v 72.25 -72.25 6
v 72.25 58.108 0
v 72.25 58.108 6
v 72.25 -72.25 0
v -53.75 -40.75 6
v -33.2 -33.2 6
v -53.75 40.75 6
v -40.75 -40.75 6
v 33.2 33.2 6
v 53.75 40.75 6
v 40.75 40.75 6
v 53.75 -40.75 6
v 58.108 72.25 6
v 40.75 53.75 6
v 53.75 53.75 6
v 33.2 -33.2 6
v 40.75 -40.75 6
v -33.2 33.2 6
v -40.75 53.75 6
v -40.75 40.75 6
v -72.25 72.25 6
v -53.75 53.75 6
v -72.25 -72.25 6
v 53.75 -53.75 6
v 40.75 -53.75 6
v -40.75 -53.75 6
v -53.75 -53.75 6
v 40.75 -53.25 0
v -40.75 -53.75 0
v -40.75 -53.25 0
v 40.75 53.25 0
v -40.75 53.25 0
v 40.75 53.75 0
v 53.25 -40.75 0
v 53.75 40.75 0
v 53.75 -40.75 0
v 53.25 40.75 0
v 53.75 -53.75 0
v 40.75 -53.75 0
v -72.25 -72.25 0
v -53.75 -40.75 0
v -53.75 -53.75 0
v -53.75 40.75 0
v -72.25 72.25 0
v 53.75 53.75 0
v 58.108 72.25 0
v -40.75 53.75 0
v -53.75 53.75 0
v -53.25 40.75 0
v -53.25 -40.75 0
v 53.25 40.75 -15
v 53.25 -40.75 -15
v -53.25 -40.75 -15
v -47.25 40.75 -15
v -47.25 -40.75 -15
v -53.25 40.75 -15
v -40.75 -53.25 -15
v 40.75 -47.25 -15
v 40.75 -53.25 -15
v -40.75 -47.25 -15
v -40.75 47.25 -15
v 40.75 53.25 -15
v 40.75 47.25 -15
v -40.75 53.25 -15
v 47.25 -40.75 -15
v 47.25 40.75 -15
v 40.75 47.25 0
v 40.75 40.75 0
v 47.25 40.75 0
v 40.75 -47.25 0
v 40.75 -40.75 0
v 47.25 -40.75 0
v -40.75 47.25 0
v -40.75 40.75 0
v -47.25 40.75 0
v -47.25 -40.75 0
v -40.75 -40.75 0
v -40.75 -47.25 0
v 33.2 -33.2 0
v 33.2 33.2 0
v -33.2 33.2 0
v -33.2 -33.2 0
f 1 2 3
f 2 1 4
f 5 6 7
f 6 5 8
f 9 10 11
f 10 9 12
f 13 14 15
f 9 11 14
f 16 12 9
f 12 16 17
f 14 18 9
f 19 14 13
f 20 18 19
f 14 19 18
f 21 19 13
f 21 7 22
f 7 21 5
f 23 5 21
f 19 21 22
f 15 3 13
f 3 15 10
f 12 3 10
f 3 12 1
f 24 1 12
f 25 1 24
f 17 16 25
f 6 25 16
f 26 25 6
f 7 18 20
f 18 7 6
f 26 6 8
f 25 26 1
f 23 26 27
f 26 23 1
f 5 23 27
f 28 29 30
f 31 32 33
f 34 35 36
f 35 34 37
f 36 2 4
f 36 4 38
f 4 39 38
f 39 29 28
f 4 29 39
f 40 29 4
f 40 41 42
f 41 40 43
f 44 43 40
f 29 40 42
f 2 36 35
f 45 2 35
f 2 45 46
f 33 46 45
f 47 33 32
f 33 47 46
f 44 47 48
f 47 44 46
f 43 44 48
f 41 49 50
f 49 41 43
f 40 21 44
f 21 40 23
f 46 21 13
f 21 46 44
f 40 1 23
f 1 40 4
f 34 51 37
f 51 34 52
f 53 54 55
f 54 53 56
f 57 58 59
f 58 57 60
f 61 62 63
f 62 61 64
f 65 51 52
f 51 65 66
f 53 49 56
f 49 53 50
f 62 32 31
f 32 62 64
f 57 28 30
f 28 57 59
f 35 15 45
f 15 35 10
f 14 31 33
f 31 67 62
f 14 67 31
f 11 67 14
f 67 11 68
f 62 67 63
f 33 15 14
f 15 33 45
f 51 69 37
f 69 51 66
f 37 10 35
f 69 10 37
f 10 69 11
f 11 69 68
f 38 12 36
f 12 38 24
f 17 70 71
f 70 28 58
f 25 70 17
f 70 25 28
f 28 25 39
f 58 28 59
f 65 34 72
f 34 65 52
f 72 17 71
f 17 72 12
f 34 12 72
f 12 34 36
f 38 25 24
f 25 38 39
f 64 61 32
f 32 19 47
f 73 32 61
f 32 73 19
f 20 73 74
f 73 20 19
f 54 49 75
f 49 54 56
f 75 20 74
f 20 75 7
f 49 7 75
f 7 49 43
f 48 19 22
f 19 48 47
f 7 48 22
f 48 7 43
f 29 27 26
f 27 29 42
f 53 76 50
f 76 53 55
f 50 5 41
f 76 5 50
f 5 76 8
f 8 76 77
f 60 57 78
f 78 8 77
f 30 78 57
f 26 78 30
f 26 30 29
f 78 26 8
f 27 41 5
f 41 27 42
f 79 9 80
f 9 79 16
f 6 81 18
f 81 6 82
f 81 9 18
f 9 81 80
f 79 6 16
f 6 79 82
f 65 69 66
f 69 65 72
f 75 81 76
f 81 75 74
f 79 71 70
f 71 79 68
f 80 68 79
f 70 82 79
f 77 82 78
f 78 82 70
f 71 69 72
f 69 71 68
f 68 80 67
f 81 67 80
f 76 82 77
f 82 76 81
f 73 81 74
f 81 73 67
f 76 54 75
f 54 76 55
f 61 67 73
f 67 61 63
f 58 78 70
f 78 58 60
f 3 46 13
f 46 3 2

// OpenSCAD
// William Box Jig

OD = 94.5;
ID = 66.4;
Wall = 6;
Extra = 50;

difference() {
  union() {
    // Top plate
    translate([0,0,Wall/2]) cube([OD+Extra, OD+Extra, Wall], center=true);
    // Sides
    translate([0,0,-15/2]) cube([OD+Wall*2, OD+Wall*2, 15], center=true);
  }
  // Cutout
  cube([ID, ID, 100], center=true);
  // Sights
  for (m = [[0,0], [0,1], [1,0], [1,1]]) mirror(m)
  translate([OD/2,OD/2,0]) cube([Wall*2+1,Wall*2+1,100], center=true);
//  cylinder(d=20,h=10*Wall,center=true);
  // Block
  #translate([0,0,-100/2]) cube([OD, OD, 100], center=true);
  // Key
  translate([(OD+Extra)/2, (OD+Extra)/2, 0]) rotate([0,0,45]) cube([20,20,Wall*4], center=true);
}
